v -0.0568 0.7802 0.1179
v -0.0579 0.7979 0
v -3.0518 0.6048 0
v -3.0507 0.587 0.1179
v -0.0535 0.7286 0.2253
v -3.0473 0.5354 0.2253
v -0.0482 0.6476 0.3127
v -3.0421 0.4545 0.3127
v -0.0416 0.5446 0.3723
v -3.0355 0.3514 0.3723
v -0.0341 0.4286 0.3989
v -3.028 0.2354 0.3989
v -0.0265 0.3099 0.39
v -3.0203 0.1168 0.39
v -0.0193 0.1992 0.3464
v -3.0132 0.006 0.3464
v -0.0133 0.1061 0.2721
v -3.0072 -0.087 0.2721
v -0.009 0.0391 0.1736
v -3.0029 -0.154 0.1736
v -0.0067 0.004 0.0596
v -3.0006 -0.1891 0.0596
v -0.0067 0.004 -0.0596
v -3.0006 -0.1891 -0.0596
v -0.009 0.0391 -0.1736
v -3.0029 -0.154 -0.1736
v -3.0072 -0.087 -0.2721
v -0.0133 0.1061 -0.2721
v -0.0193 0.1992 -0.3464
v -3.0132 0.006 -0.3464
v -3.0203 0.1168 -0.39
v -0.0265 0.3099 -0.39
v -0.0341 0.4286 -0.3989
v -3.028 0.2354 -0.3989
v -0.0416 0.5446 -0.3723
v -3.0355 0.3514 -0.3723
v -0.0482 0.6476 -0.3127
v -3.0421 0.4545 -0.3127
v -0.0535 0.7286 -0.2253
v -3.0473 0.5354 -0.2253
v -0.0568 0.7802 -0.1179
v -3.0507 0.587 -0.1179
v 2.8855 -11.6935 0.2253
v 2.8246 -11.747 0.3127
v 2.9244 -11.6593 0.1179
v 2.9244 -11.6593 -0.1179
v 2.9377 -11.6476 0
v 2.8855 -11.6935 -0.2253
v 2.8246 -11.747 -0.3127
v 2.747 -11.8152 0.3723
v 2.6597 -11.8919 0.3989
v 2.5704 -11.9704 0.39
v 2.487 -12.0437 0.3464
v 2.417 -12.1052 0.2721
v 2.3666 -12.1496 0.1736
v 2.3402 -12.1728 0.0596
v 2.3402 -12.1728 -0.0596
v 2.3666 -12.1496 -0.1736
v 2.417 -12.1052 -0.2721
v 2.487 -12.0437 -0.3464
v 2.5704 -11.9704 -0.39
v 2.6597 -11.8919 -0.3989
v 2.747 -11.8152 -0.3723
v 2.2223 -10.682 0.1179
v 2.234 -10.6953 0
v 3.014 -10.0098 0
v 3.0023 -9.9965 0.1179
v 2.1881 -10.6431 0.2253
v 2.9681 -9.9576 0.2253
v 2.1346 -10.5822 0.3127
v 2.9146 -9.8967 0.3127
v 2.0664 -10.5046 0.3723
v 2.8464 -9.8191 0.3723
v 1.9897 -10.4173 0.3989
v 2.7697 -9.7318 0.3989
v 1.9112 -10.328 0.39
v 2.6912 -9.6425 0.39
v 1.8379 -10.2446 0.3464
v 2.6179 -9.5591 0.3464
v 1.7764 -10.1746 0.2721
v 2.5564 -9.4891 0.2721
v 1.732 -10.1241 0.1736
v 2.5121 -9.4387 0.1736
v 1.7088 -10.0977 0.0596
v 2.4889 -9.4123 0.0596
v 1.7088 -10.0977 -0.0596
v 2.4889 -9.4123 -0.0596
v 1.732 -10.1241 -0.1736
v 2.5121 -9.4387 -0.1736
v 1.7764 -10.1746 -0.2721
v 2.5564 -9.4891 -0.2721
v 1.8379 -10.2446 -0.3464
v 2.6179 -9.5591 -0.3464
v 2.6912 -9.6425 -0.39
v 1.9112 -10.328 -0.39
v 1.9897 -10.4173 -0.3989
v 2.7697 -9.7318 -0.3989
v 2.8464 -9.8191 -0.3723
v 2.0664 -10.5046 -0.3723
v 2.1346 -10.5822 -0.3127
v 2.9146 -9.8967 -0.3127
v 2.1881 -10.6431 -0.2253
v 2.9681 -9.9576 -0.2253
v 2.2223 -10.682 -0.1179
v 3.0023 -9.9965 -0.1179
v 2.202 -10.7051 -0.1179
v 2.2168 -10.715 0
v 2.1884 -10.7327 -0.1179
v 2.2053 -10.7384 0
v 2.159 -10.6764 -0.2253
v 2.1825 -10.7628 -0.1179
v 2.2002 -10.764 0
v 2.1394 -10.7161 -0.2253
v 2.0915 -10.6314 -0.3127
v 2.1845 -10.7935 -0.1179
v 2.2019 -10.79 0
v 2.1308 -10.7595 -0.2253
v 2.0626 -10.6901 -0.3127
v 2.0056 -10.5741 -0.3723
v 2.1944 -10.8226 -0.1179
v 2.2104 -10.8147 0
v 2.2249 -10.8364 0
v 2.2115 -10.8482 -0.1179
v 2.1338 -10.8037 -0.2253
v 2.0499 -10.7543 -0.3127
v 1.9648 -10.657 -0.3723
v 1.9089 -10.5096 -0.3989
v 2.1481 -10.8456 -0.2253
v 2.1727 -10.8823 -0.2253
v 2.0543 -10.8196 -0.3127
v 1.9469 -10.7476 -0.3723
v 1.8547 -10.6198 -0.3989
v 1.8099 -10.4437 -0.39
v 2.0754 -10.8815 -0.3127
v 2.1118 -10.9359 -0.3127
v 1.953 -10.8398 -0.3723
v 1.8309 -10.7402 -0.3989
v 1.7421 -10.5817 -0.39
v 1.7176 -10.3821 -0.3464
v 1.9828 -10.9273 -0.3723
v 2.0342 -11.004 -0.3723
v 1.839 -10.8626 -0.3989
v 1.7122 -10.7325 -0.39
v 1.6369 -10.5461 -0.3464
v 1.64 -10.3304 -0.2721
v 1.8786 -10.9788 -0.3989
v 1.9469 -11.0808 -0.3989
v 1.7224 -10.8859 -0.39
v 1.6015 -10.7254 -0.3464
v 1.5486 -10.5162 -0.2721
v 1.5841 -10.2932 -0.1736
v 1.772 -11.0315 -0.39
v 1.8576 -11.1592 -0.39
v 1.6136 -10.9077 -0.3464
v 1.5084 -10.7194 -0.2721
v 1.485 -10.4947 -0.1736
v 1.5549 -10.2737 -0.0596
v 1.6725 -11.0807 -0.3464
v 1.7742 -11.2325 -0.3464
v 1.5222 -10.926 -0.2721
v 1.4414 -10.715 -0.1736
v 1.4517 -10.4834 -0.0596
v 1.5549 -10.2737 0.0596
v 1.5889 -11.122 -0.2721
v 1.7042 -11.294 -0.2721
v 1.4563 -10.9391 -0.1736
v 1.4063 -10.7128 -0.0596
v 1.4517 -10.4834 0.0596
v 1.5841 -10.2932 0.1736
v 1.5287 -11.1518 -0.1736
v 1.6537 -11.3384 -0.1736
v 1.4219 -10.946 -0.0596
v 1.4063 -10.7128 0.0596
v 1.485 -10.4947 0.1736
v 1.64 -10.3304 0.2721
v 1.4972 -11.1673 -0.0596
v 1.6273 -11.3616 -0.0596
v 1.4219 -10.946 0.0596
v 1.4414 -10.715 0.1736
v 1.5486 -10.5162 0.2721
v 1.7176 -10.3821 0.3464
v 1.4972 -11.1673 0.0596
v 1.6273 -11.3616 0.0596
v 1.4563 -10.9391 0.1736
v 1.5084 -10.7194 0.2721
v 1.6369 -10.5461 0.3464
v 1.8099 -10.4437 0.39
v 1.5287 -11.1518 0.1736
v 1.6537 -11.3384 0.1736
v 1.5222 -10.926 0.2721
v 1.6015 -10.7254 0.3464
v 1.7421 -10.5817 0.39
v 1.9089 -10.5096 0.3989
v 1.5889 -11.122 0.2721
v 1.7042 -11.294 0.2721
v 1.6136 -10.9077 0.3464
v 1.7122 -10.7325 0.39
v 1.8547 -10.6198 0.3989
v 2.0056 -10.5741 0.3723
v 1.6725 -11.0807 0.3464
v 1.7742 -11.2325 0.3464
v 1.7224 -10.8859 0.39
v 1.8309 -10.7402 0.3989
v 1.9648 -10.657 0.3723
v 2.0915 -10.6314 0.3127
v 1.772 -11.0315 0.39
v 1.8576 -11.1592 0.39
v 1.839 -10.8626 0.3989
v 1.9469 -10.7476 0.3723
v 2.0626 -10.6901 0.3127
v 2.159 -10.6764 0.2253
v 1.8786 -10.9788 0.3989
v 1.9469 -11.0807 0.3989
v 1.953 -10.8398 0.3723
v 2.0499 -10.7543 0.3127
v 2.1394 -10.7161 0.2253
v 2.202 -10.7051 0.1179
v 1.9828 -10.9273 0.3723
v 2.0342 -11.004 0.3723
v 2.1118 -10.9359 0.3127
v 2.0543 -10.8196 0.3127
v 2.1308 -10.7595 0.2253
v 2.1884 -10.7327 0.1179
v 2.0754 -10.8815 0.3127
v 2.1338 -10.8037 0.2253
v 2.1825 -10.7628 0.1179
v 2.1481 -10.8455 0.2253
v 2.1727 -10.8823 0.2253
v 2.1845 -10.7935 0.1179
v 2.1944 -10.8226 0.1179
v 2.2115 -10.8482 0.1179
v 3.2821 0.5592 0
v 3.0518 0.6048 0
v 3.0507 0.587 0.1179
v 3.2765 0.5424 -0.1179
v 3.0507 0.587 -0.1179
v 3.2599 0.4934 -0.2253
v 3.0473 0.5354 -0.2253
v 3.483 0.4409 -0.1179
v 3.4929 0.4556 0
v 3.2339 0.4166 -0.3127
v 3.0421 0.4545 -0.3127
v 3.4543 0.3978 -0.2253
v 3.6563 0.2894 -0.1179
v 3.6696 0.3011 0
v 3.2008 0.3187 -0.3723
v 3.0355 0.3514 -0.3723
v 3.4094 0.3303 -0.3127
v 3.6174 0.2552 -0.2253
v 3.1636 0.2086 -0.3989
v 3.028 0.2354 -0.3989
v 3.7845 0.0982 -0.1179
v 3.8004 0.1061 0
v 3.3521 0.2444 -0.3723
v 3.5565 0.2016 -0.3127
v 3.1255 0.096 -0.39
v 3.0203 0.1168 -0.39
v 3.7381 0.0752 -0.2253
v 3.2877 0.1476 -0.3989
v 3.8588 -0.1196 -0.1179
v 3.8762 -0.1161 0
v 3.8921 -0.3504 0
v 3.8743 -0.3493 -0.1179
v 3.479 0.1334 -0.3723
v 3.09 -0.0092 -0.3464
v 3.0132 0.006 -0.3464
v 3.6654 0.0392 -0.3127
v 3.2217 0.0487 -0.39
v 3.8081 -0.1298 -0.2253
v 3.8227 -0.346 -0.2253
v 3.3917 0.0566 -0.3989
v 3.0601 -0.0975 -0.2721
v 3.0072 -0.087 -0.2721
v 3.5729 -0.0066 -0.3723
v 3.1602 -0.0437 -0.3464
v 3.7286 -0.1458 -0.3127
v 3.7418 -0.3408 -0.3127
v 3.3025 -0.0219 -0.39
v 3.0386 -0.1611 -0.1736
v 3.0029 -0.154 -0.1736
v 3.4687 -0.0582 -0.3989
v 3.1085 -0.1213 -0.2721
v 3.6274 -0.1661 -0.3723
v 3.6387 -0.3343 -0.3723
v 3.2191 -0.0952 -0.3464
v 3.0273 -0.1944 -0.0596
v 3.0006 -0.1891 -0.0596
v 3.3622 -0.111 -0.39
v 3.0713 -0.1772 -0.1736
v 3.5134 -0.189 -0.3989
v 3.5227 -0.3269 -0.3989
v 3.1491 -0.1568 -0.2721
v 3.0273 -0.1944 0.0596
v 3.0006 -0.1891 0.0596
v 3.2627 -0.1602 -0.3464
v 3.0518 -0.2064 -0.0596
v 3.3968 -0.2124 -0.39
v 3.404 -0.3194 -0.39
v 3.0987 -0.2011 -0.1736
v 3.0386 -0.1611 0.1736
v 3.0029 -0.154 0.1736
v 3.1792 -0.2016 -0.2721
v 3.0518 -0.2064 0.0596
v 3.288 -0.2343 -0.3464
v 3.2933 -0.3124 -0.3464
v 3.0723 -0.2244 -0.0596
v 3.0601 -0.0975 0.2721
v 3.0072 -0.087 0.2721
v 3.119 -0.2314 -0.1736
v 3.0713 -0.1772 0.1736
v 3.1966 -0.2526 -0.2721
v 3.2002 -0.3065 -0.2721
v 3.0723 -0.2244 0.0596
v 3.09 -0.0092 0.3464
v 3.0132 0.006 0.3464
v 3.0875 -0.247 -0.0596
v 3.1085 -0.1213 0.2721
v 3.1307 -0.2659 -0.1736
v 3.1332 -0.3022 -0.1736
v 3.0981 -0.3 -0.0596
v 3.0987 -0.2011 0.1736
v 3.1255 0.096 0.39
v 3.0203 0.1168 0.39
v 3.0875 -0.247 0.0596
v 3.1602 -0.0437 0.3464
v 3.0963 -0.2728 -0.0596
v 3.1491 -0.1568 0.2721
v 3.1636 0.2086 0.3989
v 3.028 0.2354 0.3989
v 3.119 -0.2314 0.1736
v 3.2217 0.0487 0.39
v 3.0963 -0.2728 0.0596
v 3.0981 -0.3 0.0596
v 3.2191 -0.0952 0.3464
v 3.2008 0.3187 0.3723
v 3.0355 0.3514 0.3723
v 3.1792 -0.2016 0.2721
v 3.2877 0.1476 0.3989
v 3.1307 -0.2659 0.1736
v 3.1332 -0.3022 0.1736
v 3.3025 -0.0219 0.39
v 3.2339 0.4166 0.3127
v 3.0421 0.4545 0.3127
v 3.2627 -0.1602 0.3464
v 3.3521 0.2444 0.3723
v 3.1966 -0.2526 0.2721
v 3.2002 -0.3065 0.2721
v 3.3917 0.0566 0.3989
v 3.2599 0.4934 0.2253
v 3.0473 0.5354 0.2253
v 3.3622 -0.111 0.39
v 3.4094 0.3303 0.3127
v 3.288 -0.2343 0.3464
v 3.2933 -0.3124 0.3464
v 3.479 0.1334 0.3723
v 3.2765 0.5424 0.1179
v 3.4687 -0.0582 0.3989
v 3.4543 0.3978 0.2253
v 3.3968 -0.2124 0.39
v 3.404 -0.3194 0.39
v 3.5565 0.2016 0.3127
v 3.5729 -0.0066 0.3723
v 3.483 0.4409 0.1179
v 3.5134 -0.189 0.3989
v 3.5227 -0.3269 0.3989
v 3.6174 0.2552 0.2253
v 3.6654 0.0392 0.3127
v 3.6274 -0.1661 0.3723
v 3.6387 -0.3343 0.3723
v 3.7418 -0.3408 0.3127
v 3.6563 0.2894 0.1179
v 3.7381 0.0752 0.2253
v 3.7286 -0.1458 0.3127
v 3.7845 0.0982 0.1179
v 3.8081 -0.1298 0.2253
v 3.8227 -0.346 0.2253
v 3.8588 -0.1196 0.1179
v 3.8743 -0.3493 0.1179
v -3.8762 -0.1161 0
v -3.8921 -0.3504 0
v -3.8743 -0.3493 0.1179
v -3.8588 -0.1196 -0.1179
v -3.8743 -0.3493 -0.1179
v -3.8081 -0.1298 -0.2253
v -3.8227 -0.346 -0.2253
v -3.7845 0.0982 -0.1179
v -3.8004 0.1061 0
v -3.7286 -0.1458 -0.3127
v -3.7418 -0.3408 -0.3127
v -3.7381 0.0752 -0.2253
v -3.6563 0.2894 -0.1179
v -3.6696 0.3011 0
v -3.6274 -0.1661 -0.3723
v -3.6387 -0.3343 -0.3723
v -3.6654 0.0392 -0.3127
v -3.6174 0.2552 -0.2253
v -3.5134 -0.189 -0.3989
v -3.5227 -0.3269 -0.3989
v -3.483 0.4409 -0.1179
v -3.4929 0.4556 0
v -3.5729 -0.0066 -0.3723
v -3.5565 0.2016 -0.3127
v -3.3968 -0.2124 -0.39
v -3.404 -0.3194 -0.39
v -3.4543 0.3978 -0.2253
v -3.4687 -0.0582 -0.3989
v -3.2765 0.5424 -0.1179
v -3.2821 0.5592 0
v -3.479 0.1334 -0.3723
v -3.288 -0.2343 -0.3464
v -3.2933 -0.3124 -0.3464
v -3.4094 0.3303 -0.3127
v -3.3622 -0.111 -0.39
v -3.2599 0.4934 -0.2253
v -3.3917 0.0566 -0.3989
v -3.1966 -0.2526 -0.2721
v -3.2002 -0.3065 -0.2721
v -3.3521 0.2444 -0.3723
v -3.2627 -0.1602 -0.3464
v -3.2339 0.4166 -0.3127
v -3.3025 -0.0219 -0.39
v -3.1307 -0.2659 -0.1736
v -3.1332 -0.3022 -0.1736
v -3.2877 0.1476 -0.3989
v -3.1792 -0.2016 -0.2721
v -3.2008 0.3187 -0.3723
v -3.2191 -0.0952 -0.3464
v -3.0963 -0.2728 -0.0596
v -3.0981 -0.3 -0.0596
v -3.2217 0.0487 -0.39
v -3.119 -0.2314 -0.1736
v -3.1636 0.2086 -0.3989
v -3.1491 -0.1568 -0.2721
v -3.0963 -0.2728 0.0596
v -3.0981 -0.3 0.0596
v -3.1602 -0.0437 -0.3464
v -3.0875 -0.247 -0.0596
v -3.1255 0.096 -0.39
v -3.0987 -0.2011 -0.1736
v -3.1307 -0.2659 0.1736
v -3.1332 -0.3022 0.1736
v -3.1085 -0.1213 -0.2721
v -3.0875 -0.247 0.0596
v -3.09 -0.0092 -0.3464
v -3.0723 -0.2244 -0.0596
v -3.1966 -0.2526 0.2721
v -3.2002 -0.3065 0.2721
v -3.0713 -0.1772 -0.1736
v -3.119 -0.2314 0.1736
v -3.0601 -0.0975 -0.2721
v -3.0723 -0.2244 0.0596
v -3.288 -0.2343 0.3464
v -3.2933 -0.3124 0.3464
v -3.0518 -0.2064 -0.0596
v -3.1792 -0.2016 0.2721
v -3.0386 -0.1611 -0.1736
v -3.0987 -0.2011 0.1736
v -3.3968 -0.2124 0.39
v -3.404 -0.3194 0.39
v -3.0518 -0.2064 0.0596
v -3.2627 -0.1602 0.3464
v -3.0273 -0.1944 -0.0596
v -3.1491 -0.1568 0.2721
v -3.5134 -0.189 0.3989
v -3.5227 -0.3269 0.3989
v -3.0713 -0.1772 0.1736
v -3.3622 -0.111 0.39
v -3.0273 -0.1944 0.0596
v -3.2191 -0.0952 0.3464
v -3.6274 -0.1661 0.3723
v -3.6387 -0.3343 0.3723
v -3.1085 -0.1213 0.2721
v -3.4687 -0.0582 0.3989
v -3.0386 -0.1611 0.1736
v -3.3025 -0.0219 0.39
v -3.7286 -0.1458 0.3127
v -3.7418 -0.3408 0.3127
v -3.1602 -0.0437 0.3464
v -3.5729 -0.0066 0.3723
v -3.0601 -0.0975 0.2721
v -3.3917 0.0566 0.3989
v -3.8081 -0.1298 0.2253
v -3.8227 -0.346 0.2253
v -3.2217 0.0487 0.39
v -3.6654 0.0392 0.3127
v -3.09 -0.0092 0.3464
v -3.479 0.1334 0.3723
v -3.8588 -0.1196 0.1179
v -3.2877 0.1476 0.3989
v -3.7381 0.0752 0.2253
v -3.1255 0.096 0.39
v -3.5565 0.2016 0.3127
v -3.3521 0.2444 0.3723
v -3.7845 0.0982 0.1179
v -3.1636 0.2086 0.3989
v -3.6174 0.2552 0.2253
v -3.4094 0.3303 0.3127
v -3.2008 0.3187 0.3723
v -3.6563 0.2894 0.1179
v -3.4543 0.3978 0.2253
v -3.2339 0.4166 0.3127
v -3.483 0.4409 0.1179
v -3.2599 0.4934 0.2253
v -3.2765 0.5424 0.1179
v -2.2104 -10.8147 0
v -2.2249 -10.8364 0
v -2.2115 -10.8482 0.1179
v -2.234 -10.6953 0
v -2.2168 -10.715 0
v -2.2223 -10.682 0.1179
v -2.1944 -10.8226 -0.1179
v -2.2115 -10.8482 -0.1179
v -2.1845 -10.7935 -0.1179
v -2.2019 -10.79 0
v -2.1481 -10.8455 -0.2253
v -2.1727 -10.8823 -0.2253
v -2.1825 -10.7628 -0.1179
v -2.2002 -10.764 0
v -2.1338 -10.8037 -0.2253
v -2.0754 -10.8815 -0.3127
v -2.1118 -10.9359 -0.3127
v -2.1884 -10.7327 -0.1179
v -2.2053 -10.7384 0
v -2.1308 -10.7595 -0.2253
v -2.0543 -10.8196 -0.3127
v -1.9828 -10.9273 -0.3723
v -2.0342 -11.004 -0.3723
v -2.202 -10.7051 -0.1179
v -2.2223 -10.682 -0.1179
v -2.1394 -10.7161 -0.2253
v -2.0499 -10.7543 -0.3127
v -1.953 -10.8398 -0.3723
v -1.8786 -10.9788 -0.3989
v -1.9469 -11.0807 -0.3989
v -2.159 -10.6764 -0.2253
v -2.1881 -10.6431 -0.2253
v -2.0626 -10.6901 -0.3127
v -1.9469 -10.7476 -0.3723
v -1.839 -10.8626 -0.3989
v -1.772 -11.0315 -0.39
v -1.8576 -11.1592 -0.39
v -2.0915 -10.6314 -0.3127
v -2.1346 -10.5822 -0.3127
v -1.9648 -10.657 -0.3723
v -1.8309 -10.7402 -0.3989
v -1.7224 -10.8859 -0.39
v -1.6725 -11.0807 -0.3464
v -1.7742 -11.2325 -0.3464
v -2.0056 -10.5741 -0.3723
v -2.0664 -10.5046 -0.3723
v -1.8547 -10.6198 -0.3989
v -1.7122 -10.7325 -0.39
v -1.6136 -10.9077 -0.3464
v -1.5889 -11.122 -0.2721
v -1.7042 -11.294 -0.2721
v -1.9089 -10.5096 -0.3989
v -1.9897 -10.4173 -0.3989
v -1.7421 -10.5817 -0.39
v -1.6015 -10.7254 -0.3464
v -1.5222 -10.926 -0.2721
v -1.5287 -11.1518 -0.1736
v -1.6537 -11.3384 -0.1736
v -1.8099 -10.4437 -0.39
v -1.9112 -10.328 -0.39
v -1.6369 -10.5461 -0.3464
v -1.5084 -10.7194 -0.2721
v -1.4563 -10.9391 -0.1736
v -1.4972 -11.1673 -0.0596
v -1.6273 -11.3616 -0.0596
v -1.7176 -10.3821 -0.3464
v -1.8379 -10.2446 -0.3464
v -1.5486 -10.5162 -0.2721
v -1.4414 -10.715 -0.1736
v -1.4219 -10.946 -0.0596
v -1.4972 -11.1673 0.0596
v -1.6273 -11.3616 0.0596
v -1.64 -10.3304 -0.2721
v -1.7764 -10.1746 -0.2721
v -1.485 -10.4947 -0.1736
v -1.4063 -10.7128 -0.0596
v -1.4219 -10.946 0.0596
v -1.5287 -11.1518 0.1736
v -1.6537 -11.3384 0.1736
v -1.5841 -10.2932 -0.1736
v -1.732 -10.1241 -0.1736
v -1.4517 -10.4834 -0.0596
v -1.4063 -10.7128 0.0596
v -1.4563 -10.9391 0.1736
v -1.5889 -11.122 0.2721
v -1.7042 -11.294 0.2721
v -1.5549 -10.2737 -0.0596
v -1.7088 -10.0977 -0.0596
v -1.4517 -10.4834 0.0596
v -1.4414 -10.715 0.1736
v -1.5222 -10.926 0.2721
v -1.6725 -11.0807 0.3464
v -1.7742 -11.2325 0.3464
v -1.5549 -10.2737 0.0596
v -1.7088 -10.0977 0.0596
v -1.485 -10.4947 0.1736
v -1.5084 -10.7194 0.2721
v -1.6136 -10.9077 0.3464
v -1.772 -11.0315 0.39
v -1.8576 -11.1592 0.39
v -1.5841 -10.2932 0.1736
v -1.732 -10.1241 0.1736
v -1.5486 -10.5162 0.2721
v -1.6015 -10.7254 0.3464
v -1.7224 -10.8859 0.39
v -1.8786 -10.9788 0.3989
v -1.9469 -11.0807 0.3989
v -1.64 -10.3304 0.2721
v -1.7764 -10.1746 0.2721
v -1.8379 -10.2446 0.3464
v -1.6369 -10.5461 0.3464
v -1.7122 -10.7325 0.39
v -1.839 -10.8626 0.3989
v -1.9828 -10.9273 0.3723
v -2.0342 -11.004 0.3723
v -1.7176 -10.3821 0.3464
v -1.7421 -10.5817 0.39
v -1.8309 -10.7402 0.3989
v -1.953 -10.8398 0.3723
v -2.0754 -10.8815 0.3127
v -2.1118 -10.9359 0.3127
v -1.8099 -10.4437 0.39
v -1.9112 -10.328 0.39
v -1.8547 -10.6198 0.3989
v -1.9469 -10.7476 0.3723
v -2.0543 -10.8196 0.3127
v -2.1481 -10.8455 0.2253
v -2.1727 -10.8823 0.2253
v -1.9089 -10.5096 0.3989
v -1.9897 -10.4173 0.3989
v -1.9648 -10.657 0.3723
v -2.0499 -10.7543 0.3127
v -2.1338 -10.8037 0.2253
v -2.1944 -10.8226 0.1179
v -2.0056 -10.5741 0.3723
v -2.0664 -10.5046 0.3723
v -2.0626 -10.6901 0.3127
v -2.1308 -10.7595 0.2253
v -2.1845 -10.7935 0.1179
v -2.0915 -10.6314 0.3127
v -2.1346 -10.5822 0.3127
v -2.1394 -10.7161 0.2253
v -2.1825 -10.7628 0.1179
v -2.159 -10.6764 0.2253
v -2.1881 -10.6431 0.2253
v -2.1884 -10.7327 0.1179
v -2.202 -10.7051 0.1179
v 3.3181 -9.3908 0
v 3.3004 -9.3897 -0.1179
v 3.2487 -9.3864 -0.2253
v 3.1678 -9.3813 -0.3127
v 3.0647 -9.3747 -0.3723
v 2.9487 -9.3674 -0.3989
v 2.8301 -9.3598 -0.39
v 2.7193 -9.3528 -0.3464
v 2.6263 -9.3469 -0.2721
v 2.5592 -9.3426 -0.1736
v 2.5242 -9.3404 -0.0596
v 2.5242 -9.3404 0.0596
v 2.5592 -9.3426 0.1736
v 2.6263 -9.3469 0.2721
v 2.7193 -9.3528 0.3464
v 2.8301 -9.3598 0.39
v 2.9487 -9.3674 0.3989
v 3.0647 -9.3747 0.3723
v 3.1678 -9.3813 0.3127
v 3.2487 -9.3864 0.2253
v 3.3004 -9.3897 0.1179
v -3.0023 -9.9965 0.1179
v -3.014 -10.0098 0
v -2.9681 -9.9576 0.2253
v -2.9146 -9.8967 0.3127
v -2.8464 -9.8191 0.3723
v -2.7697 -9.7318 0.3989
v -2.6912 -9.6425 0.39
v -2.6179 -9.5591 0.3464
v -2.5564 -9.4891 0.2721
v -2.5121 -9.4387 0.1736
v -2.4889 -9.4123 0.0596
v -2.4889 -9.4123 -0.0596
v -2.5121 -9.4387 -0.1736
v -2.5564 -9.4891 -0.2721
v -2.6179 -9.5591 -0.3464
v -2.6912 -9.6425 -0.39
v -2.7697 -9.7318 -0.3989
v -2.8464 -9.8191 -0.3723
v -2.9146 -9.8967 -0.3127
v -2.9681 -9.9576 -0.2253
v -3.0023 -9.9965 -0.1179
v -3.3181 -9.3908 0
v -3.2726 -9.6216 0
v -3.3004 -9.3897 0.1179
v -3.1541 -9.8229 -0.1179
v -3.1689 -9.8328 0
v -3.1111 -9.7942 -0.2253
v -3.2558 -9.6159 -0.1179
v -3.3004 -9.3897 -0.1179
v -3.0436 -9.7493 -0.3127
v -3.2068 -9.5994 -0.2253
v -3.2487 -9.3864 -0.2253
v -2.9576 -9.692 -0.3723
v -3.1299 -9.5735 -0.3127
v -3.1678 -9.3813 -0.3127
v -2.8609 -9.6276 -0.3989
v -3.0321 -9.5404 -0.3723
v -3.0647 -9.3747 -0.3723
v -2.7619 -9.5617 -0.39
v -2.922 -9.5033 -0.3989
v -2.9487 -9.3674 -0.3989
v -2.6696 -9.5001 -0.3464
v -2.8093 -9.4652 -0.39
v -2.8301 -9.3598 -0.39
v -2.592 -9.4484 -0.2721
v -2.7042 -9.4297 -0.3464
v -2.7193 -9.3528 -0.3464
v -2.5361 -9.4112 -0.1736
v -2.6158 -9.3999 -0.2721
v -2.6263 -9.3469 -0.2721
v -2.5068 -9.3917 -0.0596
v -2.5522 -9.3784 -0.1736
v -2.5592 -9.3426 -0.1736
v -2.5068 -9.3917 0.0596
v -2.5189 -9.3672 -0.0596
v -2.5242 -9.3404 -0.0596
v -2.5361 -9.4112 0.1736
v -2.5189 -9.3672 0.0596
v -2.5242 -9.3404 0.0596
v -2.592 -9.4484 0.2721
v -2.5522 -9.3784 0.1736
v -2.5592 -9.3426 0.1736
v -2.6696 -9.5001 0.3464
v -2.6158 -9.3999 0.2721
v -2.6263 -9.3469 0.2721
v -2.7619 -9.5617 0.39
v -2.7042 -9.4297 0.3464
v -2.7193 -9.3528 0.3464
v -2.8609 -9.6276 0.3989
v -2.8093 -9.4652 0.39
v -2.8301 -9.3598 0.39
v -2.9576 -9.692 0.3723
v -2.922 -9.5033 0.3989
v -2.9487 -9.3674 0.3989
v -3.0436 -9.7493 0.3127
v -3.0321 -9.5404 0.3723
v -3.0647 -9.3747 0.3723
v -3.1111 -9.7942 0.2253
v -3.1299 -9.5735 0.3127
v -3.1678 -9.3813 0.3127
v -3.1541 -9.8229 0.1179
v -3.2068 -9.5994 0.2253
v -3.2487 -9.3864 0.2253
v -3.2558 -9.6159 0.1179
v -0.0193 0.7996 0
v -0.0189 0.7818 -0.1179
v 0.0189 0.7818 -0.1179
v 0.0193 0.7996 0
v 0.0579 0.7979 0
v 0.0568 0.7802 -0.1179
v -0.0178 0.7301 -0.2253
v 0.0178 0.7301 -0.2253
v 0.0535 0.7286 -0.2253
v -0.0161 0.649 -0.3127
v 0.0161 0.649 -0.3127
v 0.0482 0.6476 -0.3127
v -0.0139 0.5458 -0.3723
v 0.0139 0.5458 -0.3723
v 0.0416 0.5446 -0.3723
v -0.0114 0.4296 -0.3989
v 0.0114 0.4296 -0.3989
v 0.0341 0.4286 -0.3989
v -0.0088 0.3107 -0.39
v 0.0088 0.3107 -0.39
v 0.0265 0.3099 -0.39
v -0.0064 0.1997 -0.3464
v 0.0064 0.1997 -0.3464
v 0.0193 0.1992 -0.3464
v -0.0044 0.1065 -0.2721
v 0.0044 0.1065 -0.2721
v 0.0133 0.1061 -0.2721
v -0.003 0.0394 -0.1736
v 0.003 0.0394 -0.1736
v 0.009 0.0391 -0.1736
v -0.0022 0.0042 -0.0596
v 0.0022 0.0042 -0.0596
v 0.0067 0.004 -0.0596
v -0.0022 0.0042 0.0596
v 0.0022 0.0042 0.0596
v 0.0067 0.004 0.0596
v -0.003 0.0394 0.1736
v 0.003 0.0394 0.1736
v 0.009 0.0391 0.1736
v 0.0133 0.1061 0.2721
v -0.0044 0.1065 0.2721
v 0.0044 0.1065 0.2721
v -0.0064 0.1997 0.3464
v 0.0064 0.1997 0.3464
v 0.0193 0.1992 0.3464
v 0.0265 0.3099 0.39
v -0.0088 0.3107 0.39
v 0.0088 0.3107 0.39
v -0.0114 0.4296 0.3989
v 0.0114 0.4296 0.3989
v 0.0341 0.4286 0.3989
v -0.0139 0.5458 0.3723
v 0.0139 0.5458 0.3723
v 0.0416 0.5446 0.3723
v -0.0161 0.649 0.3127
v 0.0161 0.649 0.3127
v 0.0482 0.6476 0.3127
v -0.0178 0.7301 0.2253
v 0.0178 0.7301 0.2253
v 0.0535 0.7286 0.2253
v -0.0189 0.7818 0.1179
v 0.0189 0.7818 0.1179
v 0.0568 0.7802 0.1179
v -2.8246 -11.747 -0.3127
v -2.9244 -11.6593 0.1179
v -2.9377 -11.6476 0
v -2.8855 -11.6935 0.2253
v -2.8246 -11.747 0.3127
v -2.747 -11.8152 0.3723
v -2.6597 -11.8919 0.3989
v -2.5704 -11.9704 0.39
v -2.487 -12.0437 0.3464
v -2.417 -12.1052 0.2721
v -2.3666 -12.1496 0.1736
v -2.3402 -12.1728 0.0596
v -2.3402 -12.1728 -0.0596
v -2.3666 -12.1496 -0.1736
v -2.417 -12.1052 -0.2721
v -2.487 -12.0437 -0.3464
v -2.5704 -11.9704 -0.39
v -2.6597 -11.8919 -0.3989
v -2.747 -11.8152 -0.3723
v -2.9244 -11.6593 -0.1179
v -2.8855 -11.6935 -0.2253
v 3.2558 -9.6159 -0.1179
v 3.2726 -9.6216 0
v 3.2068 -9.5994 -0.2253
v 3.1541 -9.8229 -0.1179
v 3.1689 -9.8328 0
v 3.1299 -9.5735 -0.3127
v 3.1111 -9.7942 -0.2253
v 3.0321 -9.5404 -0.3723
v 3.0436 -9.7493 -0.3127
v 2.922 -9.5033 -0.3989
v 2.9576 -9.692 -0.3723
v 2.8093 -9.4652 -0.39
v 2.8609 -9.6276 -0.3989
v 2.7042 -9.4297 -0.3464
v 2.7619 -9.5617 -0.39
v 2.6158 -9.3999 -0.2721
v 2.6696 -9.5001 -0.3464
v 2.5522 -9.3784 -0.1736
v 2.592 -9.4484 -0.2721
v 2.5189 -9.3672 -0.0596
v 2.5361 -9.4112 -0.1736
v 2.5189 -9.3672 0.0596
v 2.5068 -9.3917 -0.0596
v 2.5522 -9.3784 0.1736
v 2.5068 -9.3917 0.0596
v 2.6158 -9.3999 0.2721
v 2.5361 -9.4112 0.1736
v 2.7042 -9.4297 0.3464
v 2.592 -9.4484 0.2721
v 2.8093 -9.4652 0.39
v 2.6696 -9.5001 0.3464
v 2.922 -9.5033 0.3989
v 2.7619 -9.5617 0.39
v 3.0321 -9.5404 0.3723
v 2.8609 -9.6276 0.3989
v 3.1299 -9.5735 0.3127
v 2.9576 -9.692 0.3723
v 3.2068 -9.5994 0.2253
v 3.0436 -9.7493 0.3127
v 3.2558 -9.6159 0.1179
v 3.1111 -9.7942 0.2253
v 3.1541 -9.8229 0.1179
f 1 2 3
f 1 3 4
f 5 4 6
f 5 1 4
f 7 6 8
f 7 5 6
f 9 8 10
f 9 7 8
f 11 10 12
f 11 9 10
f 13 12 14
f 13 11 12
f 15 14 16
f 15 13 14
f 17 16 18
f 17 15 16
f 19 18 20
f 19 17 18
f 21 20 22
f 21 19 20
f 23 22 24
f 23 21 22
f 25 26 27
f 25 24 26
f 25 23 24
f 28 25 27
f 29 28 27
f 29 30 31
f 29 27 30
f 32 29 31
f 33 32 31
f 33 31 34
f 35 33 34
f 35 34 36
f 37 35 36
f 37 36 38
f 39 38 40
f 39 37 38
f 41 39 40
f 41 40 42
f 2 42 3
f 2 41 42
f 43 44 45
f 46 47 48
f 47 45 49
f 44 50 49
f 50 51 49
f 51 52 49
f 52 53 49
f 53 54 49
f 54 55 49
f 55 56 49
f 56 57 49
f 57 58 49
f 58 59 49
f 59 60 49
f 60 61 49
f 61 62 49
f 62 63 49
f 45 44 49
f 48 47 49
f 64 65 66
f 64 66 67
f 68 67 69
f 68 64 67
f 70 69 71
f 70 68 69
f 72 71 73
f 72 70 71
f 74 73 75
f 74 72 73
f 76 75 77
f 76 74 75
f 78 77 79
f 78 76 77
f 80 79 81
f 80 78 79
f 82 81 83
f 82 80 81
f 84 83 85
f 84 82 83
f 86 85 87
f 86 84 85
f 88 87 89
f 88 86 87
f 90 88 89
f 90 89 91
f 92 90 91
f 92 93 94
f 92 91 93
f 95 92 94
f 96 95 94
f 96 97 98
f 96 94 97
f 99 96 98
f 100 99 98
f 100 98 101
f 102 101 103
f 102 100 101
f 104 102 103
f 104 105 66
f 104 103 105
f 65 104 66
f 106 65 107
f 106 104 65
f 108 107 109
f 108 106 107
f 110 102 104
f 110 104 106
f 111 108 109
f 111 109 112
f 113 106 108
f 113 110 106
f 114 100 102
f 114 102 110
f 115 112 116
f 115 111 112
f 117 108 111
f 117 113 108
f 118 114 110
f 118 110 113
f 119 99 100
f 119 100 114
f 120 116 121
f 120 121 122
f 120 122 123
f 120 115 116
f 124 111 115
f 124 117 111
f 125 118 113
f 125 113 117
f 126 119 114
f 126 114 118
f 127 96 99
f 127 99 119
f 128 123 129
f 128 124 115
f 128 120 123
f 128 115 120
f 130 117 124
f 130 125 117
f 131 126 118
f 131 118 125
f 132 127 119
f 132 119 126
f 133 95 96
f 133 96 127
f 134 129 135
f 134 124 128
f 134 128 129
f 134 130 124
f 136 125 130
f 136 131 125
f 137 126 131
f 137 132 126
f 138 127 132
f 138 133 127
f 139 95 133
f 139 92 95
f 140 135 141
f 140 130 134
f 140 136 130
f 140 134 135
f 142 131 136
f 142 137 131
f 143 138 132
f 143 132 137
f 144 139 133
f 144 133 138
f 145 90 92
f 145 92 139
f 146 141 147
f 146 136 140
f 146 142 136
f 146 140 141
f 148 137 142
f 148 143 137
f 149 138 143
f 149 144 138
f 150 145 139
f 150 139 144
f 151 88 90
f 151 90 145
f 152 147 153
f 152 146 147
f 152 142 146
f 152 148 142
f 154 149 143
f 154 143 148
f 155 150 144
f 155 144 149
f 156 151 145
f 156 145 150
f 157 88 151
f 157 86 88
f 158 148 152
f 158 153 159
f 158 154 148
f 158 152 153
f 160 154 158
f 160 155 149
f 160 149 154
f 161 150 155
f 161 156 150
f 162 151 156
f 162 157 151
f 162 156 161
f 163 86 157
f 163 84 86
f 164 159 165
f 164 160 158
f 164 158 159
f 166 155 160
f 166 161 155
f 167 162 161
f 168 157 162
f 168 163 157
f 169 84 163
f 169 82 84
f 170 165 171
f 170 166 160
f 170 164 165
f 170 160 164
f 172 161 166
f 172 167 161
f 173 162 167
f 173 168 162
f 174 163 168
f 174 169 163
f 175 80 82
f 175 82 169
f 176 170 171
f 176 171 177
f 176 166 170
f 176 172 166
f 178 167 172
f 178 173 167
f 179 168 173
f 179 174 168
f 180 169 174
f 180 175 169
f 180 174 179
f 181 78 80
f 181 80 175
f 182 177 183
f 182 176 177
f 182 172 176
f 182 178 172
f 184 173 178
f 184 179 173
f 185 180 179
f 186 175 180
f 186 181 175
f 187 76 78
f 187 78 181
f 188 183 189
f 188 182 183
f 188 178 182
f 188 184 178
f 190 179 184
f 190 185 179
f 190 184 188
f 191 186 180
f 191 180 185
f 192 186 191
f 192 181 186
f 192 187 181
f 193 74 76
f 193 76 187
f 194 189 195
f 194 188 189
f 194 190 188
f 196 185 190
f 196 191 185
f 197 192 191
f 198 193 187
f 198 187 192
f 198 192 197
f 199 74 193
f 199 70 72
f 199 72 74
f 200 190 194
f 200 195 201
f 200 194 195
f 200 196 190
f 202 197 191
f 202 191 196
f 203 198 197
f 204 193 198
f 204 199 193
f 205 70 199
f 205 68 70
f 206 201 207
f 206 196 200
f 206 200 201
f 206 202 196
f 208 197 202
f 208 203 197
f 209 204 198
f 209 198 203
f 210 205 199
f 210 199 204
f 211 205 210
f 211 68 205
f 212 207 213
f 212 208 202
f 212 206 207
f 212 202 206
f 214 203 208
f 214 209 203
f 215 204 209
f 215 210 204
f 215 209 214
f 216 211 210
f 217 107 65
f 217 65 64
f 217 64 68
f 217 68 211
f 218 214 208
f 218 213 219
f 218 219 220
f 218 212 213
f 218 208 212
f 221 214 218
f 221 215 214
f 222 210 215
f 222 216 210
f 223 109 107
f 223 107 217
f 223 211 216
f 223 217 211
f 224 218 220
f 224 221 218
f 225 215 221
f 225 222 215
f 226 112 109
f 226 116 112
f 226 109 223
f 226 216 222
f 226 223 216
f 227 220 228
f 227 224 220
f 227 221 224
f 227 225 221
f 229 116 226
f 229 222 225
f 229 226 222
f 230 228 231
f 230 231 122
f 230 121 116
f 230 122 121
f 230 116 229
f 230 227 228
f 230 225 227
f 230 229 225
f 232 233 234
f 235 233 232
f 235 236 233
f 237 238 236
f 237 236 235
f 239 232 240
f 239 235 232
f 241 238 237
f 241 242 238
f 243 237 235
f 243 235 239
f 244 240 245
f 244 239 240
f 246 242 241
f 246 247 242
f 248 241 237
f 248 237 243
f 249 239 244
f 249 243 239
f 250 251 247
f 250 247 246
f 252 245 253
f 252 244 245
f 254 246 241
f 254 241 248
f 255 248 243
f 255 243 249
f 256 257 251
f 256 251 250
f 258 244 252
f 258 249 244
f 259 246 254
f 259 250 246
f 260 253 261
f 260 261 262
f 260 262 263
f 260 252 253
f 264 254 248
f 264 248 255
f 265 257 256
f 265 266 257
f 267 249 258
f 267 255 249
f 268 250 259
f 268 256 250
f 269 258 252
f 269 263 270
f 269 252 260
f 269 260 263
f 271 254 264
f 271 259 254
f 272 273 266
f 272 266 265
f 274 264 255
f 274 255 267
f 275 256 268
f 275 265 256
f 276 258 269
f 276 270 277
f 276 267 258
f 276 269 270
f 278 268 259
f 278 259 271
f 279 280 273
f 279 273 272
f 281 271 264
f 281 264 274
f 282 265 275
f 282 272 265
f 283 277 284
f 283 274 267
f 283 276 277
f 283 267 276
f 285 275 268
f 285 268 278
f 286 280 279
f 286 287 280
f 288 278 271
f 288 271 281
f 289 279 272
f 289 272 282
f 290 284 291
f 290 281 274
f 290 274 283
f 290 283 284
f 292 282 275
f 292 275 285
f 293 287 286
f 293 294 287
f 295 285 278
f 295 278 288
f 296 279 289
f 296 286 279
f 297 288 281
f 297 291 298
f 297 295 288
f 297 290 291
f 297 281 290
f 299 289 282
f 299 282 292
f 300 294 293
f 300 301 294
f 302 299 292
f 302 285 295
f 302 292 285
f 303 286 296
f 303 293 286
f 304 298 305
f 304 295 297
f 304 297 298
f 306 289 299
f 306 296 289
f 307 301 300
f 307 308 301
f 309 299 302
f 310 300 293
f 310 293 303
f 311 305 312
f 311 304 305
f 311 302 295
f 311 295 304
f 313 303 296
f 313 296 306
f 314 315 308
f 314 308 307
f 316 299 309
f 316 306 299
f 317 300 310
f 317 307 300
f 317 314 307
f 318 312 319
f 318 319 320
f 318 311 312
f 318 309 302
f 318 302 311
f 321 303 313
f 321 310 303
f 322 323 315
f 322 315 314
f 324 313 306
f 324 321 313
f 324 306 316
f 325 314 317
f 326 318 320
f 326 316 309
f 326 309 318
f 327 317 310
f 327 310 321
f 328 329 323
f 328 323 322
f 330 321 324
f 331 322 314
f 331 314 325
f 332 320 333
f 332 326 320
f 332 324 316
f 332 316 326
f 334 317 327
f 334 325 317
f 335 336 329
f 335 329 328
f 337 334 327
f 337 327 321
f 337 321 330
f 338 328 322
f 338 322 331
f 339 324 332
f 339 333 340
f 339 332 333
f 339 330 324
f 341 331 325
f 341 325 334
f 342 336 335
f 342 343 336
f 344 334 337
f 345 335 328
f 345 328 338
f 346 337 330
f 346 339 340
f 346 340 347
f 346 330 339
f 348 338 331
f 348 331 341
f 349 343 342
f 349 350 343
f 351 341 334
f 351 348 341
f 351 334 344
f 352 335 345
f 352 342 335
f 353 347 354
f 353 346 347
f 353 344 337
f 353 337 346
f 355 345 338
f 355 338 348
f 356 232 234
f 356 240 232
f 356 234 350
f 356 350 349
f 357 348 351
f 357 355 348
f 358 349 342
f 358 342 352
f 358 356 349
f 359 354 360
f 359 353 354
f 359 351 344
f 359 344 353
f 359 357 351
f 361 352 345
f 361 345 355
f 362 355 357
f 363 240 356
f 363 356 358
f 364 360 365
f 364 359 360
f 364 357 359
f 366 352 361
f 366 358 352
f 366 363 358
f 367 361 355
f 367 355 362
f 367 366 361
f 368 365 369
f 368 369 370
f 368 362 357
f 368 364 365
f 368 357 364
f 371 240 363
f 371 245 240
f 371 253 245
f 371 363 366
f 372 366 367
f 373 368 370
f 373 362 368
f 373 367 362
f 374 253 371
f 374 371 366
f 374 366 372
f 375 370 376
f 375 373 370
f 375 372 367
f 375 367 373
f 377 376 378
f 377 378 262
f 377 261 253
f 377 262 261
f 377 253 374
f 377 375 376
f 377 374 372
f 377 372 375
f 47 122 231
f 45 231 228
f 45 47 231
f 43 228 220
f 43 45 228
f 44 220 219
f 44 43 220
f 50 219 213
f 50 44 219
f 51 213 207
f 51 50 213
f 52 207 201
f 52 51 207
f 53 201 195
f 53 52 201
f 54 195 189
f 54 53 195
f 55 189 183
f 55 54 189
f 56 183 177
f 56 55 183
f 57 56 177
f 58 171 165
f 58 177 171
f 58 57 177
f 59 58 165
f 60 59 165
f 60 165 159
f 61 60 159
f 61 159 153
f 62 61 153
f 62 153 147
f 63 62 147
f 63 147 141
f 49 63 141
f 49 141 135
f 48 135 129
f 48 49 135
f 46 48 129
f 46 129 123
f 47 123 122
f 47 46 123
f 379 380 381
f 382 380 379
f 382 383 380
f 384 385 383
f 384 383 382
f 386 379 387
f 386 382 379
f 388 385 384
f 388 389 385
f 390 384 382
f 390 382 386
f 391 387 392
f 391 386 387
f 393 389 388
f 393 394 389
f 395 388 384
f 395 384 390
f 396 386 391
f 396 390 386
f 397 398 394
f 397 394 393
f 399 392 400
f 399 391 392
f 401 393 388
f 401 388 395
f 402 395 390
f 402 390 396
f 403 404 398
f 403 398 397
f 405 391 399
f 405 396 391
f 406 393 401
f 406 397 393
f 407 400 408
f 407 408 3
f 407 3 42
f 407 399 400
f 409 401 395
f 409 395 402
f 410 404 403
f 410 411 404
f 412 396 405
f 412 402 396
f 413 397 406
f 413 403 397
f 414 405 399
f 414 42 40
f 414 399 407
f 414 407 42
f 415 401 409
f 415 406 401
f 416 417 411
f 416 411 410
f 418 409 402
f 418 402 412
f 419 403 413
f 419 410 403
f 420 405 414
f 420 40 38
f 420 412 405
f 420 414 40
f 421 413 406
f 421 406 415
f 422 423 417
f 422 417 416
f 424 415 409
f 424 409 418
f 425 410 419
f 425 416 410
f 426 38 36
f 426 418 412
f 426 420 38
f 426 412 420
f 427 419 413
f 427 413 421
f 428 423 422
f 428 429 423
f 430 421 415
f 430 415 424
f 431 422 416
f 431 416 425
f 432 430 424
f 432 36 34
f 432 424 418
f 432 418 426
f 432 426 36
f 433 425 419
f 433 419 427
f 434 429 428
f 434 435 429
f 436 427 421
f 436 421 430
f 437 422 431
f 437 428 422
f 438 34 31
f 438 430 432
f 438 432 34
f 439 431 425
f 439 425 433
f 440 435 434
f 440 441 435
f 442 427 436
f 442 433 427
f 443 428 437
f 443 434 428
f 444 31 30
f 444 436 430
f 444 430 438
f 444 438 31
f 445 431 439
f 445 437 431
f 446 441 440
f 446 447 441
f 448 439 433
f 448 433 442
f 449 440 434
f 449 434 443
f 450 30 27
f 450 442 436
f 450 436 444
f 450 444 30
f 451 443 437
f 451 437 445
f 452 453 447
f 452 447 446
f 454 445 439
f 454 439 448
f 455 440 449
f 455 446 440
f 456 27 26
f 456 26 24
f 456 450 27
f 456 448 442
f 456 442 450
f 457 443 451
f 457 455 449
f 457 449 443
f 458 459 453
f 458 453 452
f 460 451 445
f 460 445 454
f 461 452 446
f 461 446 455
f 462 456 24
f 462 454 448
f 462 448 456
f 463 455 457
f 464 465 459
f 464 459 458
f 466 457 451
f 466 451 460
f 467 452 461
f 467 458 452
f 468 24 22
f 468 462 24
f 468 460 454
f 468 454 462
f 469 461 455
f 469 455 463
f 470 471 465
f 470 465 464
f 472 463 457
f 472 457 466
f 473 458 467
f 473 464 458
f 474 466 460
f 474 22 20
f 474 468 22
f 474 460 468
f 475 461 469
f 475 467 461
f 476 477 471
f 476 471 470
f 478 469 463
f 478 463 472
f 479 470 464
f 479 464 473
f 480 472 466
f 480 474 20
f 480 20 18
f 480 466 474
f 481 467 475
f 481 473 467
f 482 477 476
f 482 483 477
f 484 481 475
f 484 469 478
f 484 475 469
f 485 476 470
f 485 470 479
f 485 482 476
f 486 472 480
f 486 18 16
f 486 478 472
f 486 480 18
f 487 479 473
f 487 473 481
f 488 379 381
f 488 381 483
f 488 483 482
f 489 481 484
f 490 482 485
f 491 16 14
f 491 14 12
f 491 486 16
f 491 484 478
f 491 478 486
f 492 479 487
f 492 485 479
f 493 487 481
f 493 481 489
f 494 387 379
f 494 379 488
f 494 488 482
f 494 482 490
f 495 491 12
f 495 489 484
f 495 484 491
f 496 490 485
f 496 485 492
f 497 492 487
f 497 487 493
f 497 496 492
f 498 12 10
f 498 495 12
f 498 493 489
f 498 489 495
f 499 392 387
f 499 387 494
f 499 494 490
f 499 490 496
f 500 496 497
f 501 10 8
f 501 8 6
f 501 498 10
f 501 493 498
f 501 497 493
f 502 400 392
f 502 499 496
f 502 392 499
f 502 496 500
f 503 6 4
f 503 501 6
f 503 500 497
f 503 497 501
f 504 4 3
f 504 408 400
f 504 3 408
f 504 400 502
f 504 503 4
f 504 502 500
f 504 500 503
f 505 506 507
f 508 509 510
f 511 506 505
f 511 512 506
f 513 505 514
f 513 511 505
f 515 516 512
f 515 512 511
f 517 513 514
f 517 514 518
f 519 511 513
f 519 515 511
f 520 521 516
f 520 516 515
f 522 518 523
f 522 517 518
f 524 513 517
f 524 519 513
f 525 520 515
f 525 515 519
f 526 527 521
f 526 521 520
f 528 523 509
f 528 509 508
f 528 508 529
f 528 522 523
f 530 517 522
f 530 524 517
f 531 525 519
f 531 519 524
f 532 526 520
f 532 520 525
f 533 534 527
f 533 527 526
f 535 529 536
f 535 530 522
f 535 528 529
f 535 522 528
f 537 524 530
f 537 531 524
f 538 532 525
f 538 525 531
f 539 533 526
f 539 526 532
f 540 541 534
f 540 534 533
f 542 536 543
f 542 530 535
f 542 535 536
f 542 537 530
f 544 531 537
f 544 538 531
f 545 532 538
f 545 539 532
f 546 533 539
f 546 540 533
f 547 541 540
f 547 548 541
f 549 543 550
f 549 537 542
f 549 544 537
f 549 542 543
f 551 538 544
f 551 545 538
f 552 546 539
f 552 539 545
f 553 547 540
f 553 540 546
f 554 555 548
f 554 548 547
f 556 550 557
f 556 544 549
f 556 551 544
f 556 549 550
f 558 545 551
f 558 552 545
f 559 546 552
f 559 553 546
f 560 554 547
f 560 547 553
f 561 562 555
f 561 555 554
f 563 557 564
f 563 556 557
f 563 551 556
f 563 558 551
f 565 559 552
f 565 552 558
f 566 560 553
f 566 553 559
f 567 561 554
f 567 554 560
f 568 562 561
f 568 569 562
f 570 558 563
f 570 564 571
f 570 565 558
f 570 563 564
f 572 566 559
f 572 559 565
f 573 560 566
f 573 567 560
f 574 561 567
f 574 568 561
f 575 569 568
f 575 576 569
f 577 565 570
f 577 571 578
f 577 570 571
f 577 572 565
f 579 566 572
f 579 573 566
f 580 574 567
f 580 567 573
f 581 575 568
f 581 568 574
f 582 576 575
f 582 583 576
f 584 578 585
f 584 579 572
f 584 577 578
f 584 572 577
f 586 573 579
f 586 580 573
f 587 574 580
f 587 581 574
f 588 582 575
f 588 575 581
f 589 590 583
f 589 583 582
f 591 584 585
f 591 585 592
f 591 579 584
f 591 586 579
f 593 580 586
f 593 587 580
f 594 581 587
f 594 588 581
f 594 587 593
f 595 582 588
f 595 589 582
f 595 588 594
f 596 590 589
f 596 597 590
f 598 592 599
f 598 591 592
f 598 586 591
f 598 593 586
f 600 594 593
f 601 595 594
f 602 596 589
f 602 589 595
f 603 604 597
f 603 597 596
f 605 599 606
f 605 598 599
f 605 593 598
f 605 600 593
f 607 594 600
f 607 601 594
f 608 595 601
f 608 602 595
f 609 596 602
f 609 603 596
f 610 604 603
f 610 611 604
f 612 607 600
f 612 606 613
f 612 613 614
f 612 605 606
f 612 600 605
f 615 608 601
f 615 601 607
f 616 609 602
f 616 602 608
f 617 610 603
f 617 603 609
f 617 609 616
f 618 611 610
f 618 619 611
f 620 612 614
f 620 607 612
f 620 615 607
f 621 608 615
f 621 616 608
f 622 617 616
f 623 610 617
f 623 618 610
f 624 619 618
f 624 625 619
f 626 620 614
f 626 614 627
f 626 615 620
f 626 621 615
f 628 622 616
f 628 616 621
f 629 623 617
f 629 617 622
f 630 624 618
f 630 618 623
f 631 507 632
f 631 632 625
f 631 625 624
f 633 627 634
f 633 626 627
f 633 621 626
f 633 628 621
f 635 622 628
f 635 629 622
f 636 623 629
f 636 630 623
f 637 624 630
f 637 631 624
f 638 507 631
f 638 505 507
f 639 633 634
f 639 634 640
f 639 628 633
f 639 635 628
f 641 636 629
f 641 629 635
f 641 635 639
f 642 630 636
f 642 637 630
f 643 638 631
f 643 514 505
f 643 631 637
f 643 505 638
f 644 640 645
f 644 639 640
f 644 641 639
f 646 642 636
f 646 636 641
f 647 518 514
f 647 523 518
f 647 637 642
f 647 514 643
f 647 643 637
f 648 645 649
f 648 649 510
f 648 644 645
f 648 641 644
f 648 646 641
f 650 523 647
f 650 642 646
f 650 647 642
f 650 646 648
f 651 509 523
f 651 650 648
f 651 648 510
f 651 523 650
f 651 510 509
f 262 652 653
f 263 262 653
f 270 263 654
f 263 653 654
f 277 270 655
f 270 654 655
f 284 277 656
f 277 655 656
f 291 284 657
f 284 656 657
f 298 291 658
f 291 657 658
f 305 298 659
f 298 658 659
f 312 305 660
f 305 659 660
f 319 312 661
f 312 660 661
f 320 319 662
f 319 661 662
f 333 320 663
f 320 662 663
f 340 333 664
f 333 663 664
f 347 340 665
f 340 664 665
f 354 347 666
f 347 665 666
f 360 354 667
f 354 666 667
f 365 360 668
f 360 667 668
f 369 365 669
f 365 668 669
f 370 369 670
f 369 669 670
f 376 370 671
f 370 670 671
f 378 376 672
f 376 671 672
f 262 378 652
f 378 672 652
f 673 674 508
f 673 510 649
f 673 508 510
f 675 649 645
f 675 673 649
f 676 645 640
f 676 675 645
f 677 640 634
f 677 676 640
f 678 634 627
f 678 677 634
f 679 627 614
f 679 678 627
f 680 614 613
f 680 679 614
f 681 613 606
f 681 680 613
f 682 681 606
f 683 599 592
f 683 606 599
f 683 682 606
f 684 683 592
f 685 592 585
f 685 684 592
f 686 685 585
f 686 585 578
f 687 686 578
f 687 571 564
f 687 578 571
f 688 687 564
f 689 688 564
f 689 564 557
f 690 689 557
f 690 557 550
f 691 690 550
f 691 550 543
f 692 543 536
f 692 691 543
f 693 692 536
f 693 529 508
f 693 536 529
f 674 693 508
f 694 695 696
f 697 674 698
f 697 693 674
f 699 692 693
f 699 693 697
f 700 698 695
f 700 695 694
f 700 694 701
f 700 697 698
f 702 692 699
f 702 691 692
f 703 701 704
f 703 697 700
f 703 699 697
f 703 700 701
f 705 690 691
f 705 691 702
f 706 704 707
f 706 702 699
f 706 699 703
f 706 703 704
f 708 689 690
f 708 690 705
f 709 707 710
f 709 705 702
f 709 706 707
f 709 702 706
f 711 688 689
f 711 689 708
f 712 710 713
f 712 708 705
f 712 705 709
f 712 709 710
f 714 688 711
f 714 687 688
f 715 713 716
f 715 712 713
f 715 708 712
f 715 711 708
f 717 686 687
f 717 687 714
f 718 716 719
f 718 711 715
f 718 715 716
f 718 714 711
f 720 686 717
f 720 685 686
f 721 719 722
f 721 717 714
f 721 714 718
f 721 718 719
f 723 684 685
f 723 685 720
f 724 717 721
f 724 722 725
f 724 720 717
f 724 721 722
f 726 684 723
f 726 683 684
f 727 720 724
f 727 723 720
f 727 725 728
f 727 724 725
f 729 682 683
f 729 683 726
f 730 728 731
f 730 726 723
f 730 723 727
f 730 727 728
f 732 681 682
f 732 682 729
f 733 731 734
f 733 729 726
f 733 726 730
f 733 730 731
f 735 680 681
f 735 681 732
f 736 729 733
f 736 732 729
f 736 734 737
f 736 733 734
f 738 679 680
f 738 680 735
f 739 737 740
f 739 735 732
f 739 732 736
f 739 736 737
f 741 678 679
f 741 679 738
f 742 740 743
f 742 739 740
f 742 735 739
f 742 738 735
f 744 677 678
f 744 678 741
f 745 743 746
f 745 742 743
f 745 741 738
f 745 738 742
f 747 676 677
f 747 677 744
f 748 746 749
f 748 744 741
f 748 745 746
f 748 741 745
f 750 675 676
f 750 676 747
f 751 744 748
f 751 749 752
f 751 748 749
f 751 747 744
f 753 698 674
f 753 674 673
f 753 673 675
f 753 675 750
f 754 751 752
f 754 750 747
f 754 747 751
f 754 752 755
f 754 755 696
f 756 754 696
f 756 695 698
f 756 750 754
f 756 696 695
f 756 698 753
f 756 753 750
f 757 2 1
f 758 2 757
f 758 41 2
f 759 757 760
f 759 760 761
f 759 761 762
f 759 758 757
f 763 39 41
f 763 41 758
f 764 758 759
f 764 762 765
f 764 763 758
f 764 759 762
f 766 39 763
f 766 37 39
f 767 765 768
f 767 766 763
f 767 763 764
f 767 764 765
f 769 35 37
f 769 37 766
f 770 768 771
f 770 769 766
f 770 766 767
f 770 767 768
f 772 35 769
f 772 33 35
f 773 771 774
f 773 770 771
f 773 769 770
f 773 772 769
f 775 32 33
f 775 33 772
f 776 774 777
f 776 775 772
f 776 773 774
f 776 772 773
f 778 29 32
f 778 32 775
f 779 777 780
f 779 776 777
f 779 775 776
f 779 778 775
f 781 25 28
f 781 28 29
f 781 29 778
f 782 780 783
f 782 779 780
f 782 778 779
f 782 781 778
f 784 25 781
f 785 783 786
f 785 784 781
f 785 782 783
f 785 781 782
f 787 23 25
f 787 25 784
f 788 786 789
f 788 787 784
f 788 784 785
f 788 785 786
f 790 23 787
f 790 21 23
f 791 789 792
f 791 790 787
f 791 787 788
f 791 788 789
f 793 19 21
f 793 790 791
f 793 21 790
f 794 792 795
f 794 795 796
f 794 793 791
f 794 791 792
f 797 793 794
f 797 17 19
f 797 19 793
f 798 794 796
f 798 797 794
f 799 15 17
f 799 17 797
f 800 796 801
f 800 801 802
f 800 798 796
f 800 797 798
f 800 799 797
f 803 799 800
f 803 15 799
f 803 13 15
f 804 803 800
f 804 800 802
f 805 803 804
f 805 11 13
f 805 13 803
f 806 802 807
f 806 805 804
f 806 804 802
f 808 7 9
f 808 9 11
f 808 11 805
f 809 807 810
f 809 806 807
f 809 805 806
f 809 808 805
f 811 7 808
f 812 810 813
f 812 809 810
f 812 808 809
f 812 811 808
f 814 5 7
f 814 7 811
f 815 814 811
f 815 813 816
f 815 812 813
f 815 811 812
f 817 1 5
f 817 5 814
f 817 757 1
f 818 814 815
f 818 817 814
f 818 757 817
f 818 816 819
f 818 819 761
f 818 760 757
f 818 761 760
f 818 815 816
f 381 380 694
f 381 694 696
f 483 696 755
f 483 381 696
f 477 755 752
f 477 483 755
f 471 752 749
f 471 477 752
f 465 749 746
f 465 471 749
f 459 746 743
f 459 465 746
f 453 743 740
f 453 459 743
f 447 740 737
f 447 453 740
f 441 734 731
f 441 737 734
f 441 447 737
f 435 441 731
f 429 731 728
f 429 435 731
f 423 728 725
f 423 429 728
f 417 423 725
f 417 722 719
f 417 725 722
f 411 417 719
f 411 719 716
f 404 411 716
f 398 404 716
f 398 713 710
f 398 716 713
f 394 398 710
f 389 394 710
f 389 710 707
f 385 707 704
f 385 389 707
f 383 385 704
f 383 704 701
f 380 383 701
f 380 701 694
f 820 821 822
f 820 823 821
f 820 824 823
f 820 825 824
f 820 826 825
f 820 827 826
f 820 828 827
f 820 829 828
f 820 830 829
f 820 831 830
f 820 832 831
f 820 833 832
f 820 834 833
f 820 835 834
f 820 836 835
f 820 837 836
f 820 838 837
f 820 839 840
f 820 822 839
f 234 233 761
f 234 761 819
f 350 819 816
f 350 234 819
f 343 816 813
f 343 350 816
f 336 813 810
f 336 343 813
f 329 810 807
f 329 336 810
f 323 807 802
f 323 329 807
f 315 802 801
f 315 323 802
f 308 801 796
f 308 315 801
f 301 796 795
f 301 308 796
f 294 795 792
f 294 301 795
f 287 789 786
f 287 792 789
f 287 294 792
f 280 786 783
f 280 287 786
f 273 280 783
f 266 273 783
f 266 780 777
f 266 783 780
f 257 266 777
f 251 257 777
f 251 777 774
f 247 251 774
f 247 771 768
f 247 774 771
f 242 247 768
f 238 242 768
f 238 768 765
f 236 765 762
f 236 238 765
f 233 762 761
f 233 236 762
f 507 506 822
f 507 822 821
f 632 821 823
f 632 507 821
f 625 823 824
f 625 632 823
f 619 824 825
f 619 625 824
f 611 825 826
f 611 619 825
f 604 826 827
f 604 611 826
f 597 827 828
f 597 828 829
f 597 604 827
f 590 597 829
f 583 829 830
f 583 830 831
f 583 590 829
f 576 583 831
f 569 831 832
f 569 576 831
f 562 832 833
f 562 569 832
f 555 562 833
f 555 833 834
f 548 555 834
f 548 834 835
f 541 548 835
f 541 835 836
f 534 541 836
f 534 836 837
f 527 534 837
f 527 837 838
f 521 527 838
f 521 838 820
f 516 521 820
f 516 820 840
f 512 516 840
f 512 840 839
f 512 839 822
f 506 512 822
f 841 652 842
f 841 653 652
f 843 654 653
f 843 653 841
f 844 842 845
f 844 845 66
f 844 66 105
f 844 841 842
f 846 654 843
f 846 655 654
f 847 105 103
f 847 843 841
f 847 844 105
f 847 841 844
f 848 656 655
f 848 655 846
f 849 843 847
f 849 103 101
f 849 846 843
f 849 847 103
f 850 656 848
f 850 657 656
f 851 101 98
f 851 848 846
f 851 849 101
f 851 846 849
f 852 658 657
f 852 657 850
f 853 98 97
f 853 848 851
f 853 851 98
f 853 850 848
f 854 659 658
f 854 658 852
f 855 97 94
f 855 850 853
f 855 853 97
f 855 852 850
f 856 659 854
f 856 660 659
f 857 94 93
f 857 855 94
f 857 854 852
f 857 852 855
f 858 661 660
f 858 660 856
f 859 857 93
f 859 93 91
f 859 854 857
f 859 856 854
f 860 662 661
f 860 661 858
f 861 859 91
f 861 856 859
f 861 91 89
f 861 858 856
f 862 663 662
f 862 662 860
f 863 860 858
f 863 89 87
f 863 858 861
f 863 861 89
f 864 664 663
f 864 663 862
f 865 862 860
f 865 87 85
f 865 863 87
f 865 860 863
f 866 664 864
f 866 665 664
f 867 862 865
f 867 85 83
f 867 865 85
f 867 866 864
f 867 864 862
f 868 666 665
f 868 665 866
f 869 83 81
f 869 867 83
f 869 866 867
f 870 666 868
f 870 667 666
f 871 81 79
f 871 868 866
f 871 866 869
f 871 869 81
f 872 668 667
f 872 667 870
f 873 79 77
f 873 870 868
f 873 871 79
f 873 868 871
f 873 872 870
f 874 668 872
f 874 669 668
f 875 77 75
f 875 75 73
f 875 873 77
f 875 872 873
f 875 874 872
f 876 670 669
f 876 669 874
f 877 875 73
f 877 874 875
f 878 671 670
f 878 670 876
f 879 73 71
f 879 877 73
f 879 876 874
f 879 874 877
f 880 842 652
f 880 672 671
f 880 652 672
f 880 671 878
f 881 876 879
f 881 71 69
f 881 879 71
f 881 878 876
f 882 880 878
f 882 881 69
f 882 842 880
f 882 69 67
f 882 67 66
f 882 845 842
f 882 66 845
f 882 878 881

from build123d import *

# Parameters (mm, degrees)
SKETCH2_R = 0.4


with BuildPart() as part:
    # Sweep2: sweep along a path in Sketch1
    with BuildLine(Plane.XY) as sweep2_path:
        Line((-2.336808688, -12.175709903), (-1.623951591, -11.36452769))
        ThreePointArc((-1.623951591, -11.36452769), (-1.401867222, -10.712480492), (-1.705896853, -10.094376134))
        Line((-1.705896853, -10.094376134), (-2.485919755, -9.408901463))
        ThreePointArc((-2.485919755, -9.408901463), (-2.509663341, -9.377876145), (-2.519707362, -9.340121067))
        Line((-2.519707362, -9.340121067), (-3.093670387, -0.299696983))
        ThreePointArc((-3.093670387, -0.299696983), (-3.068954021, -0.227310998), (-3.000309548, -0.193568358))
        Line((-3.000309548, -0.193568358), (-0.006438228, -0.00041537))
        ThreePointArc((-0.006438228, -0.00041537), (0, -0.0002079), (0.006438228, -0.00041537))
        Line((0.006438228, -0.00041537), (3.000309548, -0.193568358))
        ThreePointArc((3.000309548, -0.193568358), (3.068954021, -0.227310998), (3.093670387, -0.299696983))
        Line((3.093670387, -0.299696983), (2.519707362, -9.340121067))
        ThreePointArc((2.519707362, -9.340121067), (2.509663341, -9.377876145), (2.485919755, -9.408901463))
        Line((2.485919755, -9.408901463), (1.705896853, -10.094376134))
        ThreePointArc((1.705896853, -10.094376134), (1.401867222, -10.712480492), (1.623951591, -11.36452769))
        Line((1.623951591, -11.36452769), (2.336808688, -12.175709903))
    # Sketch2 → Sweep2 (sweep)
    with BuildSketch(Plane(origin=(-2.336808688, -12.175709903, 0), x_dir=(-0.7511648984498777, 0.6601146077286768, 0), z_dir=(-0.6601146077286769, -0.7511648984498778, 0))):
        with Locations((0.4, 0)):
            Circle(SKETCH2_R)
    sweep(path=sweep2_path.line)


solid = part.part
